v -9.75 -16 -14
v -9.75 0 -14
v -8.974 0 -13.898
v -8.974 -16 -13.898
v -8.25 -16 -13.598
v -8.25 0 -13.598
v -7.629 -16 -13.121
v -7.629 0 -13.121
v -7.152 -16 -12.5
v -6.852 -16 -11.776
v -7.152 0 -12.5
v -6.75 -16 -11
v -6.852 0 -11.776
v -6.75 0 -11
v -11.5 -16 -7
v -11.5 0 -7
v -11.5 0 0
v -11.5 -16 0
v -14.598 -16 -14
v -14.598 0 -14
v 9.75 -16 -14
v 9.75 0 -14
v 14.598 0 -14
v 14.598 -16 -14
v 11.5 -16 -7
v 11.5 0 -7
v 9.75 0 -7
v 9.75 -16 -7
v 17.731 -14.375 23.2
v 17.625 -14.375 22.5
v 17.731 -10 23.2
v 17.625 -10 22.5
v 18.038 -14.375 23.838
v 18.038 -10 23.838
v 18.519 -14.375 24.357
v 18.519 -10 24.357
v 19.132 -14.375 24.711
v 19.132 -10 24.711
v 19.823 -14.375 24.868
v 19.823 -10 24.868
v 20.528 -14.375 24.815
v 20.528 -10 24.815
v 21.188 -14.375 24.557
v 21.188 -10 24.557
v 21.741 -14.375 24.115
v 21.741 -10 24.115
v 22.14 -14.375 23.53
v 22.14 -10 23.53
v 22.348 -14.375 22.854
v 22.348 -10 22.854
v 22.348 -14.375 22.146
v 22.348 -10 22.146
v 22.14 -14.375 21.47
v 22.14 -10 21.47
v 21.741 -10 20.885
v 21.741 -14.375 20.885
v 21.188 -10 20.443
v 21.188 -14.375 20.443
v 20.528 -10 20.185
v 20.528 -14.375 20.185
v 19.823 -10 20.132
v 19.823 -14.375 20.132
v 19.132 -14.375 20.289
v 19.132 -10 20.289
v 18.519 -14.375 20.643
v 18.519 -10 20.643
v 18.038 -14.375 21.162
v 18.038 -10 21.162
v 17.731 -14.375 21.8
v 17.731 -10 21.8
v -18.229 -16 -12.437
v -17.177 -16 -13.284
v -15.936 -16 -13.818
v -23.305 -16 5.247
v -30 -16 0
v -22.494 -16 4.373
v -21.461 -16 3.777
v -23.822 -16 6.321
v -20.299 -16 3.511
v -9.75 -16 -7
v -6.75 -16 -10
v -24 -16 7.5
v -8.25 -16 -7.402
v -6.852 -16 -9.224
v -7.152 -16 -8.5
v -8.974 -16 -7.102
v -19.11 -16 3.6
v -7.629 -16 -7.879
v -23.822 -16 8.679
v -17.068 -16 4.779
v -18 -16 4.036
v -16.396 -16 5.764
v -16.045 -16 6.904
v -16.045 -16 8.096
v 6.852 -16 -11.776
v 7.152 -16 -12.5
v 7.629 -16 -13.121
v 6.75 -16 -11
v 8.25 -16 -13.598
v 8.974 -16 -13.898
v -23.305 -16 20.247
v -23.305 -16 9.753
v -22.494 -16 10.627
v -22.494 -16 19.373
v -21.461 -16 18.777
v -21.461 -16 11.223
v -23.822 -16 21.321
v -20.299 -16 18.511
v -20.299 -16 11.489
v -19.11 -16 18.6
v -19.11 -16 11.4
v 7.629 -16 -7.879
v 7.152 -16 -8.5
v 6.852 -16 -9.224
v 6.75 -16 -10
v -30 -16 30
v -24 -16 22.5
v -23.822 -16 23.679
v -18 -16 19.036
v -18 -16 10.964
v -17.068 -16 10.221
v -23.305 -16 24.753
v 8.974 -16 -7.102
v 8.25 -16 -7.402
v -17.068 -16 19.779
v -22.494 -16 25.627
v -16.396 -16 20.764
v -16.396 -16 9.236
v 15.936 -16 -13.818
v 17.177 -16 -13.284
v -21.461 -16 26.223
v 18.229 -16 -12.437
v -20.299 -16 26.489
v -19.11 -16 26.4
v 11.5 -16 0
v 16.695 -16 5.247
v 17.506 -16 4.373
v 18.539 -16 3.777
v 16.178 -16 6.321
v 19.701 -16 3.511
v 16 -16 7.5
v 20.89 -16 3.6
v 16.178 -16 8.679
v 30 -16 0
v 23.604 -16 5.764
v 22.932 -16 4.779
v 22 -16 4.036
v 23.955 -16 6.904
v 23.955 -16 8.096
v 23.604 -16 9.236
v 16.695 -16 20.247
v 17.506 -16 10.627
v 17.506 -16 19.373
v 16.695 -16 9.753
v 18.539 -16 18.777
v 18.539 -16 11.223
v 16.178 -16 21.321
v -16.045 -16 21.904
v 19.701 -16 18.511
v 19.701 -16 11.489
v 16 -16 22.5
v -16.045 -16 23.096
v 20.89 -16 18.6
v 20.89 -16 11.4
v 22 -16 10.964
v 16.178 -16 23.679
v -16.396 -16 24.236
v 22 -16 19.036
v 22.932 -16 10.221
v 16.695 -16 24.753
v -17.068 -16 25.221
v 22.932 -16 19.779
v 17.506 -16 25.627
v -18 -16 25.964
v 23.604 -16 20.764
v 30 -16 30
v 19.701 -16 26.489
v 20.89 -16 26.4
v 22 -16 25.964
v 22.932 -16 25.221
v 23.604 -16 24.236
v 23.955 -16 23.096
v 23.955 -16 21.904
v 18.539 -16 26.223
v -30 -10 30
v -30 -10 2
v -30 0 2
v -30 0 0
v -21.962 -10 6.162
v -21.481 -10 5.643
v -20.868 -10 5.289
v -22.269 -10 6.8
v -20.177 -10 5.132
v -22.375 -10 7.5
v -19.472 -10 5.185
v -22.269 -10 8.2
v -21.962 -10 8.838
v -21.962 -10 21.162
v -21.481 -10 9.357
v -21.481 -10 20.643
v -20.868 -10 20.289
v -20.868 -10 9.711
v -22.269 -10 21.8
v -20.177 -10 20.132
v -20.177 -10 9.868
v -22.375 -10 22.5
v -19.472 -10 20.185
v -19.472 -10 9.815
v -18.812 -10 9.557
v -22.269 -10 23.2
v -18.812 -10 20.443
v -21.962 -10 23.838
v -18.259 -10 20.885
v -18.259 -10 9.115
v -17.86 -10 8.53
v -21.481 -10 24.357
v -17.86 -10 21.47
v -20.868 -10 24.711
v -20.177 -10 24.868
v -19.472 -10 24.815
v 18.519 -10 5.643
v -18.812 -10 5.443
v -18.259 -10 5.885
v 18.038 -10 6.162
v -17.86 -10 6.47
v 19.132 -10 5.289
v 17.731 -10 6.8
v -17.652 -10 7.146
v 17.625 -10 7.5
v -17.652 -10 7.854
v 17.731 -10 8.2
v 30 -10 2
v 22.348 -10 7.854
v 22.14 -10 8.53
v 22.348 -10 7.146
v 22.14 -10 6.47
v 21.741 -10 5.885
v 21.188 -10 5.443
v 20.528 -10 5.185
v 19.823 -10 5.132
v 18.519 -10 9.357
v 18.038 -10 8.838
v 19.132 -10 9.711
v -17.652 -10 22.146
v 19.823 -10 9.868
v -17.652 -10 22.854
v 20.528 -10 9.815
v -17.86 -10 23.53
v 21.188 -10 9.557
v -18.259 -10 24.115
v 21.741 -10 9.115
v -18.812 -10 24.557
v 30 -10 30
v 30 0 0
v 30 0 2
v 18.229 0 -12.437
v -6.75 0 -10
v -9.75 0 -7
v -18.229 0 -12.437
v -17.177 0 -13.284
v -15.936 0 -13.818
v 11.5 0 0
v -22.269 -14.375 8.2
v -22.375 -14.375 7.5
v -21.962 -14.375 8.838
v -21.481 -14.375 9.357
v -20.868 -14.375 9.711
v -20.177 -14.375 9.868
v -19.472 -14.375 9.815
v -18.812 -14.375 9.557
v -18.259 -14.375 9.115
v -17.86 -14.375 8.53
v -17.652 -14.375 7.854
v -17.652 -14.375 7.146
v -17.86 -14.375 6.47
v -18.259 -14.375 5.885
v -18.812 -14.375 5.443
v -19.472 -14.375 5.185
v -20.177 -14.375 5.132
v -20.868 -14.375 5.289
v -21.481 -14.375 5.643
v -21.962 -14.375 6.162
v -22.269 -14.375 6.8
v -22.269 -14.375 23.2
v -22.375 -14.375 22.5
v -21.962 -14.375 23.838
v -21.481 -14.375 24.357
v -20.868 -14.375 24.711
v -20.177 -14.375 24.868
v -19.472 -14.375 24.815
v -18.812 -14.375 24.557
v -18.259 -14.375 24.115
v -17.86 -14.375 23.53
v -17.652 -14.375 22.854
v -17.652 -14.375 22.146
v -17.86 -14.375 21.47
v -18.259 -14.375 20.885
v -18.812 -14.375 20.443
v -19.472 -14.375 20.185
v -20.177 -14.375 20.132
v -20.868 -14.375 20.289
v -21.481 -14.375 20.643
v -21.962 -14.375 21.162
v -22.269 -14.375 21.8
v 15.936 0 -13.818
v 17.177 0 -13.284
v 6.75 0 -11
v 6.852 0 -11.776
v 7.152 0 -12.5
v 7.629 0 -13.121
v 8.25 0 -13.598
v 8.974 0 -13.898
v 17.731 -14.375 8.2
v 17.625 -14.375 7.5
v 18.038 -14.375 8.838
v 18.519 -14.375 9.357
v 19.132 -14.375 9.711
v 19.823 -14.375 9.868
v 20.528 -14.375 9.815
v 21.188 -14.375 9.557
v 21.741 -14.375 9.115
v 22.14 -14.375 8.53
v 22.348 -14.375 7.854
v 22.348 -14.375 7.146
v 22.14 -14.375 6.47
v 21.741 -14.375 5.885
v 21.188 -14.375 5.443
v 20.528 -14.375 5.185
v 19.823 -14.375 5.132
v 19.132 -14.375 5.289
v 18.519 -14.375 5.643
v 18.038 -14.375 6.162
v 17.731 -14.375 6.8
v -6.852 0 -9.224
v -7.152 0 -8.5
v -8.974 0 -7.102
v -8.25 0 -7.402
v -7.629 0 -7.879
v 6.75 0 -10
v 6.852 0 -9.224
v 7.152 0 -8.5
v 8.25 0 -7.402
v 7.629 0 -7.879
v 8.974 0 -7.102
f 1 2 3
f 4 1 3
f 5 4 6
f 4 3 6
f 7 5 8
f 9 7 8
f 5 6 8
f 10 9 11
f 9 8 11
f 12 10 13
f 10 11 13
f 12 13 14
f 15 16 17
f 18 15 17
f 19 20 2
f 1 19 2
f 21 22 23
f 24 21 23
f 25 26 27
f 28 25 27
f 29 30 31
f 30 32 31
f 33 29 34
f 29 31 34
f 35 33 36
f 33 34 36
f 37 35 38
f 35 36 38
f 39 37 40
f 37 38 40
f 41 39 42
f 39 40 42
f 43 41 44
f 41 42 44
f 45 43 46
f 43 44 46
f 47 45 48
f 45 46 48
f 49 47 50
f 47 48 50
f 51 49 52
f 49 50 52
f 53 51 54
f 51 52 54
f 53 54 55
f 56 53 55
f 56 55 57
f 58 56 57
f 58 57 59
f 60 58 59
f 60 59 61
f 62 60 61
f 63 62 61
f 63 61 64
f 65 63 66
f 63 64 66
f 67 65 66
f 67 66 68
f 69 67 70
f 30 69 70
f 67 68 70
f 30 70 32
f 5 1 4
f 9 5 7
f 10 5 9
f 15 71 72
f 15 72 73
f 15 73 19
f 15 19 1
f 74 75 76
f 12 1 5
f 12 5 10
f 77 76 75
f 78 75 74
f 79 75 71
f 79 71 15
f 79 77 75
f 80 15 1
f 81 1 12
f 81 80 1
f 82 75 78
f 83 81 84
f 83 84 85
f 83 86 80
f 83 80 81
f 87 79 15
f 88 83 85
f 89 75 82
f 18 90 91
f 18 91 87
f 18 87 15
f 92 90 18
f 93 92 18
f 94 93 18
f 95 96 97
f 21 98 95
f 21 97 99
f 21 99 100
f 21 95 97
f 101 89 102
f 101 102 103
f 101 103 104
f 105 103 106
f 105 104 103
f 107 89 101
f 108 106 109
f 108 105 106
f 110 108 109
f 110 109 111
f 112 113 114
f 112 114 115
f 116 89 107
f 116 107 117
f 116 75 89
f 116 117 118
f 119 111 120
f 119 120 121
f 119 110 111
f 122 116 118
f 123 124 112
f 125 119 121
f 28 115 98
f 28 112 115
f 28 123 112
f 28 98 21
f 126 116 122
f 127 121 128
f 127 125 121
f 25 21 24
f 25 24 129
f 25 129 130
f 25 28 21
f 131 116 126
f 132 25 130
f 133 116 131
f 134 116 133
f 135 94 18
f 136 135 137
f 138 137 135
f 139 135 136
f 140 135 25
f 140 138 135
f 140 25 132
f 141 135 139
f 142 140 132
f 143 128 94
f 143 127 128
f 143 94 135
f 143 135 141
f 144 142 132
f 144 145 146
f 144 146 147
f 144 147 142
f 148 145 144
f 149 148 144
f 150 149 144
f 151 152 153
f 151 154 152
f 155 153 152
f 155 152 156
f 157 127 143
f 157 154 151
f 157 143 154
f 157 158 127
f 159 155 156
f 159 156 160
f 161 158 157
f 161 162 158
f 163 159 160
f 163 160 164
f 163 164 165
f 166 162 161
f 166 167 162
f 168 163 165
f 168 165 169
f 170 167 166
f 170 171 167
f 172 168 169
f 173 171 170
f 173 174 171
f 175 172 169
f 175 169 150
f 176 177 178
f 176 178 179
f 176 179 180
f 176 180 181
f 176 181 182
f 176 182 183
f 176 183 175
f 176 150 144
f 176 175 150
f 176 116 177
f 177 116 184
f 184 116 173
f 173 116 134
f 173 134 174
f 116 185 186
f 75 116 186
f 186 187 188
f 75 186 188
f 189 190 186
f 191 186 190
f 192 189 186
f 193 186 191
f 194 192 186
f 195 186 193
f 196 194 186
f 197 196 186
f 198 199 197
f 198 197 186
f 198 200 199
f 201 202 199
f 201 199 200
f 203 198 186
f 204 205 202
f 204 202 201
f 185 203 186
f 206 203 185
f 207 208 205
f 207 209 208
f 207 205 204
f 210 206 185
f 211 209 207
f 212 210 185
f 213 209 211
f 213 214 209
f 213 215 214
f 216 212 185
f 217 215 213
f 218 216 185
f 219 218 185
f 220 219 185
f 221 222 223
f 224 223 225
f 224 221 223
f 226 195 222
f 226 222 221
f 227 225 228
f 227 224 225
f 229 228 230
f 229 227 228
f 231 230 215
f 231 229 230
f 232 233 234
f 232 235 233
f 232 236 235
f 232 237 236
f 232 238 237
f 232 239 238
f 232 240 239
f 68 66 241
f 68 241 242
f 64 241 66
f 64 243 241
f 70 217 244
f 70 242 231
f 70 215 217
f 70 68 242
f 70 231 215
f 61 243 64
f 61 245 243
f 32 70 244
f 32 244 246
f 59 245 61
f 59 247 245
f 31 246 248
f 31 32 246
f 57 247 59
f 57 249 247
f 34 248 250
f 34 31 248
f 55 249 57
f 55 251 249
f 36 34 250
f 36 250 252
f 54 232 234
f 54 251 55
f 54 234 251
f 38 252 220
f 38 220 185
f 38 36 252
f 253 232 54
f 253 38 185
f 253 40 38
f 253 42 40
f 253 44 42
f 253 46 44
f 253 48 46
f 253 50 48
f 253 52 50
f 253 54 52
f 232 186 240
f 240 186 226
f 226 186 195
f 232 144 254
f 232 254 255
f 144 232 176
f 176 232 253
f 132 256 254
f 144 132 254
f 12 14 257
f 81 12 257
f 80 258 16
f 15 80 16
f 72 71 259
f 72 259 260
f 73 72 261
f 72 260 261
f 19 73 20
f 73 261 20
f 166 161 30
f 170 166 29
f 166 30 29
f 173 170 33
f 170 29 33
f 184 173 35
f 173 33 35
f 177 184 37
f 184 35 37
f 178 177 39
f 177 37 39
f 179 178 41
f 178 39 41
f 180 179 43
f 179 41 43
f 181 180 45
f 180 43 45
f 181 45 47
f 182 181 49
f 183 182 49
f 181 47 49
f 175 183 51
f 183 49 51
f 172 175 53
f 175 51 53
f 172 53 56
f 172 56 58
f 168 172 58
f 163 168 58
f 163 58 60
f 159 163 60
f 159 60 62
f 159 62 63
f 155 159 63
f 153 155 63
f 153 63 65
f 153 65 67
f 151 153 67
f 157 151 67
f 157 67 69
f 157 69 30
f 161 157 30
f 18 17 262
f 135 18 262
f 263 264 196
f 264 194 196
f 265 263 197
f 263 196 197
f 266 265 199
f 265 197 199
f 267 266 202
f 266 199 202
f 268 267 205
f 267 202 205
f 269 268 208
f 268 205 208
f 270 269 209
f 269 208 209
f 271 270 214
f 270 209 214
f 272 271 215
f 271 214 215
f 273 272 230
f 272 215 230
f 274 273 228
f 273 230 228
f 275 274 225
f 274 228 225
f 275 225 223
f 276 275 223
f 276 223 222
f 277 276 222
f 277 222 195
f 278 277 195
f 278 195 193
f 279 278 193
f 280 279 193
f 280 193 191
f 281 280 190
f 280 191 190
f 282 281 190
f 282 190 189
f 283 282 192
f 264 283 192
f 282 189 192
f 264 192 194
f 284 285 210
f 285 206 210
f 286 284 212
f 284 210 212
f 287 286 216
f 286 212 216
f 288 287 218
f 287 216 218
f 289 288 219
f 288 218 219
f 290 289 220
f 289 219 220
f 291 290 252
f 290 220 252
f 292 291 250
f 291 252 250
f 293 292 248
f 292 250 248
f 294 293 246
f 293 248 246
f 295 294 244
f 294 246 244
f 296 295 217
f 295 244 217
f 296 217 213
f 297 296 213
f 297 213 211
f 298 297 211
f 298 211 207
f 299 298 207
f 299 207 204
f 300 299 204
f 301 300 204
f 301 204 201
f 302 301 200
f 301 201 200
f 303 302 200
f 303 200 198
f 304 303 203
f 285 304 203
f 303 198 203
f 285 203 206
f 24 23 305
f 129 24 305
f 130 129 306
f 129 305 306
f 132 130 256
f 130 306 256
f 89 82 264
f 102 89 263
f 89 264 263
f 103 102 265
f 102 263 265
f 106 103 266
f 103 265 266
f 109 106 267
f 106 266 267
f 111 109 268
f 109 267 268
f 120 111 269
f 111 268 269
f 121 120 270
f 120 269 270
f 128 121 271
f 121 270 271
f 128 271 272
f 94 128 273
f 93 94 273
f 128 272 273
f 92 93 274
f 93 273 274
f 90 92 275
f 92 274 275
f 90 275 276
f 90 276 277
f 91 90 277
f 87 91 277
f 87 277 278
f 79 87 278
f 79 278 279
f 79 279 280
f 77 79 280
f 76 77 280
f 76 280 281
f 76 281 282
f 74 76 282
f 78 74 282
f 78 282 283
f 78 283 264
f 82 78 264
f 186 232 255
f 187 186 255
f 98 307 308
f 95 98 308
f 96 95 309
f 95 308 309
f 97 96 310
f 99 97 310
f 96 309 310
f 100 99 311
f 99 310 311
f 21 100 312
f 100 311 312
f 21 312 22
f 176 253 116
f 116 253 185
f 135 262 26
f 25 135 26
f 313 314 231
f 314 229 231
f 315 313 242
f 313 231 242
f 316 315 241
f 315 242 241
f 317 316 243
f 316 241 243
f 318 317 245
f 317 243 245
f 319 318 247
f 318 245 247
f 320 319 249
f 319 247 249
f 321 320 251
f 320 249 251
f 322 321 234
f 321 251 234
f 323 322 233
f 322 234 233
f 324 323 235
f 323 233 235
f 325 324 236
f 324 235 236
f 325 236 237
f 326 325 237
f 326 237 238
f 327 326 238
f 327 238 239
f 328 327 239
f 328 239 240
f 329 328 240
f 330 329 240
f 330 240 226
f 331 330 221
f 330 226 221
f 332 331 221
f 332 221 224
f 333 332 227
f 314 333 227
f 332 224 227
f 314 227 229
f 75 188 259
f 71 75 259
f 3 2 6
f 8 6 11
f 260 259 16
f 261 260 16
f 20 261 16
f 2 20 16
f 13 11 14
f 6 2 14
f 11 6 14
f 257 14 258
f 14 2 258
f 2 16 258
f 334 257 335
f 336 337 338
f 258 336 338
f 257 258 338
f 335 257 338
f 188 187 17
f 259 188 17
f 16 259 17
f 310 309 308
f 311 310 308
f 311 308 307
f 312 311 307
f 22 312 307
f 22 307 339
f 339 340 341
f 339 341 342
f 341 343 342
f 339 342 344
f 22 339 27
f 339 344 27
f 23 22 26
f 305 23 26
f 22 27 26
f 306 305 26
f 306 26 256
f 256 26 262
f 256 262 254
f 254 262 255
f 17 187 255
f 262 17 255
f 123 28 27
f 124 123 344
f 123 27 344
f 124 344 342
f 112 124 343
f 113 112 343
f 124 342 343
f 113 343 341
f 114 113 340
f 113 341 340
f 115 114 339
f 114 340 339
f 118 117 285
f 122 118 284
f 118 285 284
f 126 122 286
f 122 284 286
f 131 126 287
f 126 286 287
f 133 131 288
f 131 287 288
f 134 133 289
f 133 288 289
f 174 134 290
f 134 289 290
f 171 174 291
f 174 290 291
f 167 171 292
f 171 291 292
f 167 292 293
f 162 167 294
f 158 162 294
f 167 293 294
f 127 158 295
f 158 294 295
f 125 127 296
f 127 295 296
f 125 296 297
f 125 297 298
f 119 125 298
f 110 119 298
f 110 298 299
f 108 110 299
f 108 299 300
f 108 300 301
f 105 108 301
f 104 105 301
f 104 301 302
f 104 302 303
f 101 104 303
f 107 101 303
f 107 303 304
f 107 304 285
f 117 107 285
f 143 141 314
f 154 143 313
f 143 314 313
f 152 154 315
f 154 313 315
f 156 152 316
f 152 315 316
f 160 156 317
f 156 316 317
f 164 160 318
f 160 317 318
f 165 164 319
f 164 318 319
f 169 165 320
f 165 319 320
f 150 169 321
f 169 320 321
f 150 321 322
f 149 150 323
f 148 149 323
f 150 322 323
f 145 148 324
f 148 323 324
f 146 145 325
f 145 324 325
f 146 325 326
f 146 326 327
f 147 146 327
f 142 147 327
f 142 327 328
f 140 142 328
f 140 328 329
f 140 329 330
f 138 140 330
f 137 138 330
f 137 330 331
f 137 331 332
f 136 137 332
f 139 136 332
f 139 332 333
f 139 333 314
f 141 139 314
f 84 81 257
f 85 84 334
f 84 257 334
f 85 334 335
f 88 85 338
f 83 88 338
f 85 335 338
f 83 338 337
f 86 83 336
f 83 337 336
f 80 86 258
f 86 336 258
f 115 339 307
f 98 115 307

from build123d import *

# Parameters (mm, degrees)
F1_DEPTH       = 16
F2_W           = 20
F2_H           = 40
F3_DEPTH       = 50
F5_D           = 4.75
F5_CSINK_D     = 8
F5_CSINK_ANGLE = 90


with BuildPart() as f1:
    # F0 (on Front) → F1 (new body)
    with BuildSketch(Plane.XZ):
        with BuildLine():
            Line((-11.5, 0), (0, 0))
            Line((0, 0), (11.5, 0))
            Line((11.5, 0), (11.5, -7))
            Line((11.5, -7), (9.75, -7))
            ThreePointArc((9.75, -7), (7.6286796564, -7.8786796564), (6.75, -10))
            Line((6.75, -10), (6.75, -11))
            ThreePointArc((6.75, -11), (7.6286796564, -13.1213203436), (9.75, -14))
            Line((9.75, -14), (14.5978726692, -14))
            ThreePointArc((14.5978726692, -14), (16.5746603892, -13.5926365315), (18.2293396683, -12.4369241241))
            Line((18.2293396683, -12.4369241241), (30, 0))
            Line((30, 0), (30, 30))
            Line((30, 30), (0, 30))
            Line((0, 30), (-30, 30))
            Line((-30, 30), (-30, 0))
            Line((-30, 0), (-18.2293396683, -12.4369241241))
            ThreePointArc((-18.2293396683, -12.4369241241), (-16.5746603892, -13.5926365315), (-14.5978726692, -14))
            Line((-14.5978726692, -14), (-9.75, -14))
            ThreePointArc((-9.75, -14), (-7.6286796564, -13.1213203436), (-6.75, -11))
            Line((-6.75, -11), (-6.75, -10))
            ThreePointArc((-6.75, -10), (-7.6286796564, -7.8786796564), (-9.75, -7))
            Line((-9.75, -7), (-11.5, -7))
            Line((-11.5, -7), (-11.5, 0))
        make_face()
    extrude(amount=F1_DEPTH)

    # F2 (on Right) → F3 (cut, symmetric)
    with BuildSketch(Plane.YZ):
        with Locations((0, 22)):
            Rectangle(F2_W, F2_H)
    extrude(amount=F3_DEPTH, both=True, mode=Mode.SUBTRACT)

    # F5 (through all)
    with Locations(Plane.XZ.offset(16)):
        with Locations((20, 22.5), (20, 7.5), (-20, 22.5), (-20, 7.5)):
            CounterSinkHole(F5_D / 2, F5_CSINK_D / 2, counter_sink_angle=F5_CSINK_ANGLE)


solid = f1.part
